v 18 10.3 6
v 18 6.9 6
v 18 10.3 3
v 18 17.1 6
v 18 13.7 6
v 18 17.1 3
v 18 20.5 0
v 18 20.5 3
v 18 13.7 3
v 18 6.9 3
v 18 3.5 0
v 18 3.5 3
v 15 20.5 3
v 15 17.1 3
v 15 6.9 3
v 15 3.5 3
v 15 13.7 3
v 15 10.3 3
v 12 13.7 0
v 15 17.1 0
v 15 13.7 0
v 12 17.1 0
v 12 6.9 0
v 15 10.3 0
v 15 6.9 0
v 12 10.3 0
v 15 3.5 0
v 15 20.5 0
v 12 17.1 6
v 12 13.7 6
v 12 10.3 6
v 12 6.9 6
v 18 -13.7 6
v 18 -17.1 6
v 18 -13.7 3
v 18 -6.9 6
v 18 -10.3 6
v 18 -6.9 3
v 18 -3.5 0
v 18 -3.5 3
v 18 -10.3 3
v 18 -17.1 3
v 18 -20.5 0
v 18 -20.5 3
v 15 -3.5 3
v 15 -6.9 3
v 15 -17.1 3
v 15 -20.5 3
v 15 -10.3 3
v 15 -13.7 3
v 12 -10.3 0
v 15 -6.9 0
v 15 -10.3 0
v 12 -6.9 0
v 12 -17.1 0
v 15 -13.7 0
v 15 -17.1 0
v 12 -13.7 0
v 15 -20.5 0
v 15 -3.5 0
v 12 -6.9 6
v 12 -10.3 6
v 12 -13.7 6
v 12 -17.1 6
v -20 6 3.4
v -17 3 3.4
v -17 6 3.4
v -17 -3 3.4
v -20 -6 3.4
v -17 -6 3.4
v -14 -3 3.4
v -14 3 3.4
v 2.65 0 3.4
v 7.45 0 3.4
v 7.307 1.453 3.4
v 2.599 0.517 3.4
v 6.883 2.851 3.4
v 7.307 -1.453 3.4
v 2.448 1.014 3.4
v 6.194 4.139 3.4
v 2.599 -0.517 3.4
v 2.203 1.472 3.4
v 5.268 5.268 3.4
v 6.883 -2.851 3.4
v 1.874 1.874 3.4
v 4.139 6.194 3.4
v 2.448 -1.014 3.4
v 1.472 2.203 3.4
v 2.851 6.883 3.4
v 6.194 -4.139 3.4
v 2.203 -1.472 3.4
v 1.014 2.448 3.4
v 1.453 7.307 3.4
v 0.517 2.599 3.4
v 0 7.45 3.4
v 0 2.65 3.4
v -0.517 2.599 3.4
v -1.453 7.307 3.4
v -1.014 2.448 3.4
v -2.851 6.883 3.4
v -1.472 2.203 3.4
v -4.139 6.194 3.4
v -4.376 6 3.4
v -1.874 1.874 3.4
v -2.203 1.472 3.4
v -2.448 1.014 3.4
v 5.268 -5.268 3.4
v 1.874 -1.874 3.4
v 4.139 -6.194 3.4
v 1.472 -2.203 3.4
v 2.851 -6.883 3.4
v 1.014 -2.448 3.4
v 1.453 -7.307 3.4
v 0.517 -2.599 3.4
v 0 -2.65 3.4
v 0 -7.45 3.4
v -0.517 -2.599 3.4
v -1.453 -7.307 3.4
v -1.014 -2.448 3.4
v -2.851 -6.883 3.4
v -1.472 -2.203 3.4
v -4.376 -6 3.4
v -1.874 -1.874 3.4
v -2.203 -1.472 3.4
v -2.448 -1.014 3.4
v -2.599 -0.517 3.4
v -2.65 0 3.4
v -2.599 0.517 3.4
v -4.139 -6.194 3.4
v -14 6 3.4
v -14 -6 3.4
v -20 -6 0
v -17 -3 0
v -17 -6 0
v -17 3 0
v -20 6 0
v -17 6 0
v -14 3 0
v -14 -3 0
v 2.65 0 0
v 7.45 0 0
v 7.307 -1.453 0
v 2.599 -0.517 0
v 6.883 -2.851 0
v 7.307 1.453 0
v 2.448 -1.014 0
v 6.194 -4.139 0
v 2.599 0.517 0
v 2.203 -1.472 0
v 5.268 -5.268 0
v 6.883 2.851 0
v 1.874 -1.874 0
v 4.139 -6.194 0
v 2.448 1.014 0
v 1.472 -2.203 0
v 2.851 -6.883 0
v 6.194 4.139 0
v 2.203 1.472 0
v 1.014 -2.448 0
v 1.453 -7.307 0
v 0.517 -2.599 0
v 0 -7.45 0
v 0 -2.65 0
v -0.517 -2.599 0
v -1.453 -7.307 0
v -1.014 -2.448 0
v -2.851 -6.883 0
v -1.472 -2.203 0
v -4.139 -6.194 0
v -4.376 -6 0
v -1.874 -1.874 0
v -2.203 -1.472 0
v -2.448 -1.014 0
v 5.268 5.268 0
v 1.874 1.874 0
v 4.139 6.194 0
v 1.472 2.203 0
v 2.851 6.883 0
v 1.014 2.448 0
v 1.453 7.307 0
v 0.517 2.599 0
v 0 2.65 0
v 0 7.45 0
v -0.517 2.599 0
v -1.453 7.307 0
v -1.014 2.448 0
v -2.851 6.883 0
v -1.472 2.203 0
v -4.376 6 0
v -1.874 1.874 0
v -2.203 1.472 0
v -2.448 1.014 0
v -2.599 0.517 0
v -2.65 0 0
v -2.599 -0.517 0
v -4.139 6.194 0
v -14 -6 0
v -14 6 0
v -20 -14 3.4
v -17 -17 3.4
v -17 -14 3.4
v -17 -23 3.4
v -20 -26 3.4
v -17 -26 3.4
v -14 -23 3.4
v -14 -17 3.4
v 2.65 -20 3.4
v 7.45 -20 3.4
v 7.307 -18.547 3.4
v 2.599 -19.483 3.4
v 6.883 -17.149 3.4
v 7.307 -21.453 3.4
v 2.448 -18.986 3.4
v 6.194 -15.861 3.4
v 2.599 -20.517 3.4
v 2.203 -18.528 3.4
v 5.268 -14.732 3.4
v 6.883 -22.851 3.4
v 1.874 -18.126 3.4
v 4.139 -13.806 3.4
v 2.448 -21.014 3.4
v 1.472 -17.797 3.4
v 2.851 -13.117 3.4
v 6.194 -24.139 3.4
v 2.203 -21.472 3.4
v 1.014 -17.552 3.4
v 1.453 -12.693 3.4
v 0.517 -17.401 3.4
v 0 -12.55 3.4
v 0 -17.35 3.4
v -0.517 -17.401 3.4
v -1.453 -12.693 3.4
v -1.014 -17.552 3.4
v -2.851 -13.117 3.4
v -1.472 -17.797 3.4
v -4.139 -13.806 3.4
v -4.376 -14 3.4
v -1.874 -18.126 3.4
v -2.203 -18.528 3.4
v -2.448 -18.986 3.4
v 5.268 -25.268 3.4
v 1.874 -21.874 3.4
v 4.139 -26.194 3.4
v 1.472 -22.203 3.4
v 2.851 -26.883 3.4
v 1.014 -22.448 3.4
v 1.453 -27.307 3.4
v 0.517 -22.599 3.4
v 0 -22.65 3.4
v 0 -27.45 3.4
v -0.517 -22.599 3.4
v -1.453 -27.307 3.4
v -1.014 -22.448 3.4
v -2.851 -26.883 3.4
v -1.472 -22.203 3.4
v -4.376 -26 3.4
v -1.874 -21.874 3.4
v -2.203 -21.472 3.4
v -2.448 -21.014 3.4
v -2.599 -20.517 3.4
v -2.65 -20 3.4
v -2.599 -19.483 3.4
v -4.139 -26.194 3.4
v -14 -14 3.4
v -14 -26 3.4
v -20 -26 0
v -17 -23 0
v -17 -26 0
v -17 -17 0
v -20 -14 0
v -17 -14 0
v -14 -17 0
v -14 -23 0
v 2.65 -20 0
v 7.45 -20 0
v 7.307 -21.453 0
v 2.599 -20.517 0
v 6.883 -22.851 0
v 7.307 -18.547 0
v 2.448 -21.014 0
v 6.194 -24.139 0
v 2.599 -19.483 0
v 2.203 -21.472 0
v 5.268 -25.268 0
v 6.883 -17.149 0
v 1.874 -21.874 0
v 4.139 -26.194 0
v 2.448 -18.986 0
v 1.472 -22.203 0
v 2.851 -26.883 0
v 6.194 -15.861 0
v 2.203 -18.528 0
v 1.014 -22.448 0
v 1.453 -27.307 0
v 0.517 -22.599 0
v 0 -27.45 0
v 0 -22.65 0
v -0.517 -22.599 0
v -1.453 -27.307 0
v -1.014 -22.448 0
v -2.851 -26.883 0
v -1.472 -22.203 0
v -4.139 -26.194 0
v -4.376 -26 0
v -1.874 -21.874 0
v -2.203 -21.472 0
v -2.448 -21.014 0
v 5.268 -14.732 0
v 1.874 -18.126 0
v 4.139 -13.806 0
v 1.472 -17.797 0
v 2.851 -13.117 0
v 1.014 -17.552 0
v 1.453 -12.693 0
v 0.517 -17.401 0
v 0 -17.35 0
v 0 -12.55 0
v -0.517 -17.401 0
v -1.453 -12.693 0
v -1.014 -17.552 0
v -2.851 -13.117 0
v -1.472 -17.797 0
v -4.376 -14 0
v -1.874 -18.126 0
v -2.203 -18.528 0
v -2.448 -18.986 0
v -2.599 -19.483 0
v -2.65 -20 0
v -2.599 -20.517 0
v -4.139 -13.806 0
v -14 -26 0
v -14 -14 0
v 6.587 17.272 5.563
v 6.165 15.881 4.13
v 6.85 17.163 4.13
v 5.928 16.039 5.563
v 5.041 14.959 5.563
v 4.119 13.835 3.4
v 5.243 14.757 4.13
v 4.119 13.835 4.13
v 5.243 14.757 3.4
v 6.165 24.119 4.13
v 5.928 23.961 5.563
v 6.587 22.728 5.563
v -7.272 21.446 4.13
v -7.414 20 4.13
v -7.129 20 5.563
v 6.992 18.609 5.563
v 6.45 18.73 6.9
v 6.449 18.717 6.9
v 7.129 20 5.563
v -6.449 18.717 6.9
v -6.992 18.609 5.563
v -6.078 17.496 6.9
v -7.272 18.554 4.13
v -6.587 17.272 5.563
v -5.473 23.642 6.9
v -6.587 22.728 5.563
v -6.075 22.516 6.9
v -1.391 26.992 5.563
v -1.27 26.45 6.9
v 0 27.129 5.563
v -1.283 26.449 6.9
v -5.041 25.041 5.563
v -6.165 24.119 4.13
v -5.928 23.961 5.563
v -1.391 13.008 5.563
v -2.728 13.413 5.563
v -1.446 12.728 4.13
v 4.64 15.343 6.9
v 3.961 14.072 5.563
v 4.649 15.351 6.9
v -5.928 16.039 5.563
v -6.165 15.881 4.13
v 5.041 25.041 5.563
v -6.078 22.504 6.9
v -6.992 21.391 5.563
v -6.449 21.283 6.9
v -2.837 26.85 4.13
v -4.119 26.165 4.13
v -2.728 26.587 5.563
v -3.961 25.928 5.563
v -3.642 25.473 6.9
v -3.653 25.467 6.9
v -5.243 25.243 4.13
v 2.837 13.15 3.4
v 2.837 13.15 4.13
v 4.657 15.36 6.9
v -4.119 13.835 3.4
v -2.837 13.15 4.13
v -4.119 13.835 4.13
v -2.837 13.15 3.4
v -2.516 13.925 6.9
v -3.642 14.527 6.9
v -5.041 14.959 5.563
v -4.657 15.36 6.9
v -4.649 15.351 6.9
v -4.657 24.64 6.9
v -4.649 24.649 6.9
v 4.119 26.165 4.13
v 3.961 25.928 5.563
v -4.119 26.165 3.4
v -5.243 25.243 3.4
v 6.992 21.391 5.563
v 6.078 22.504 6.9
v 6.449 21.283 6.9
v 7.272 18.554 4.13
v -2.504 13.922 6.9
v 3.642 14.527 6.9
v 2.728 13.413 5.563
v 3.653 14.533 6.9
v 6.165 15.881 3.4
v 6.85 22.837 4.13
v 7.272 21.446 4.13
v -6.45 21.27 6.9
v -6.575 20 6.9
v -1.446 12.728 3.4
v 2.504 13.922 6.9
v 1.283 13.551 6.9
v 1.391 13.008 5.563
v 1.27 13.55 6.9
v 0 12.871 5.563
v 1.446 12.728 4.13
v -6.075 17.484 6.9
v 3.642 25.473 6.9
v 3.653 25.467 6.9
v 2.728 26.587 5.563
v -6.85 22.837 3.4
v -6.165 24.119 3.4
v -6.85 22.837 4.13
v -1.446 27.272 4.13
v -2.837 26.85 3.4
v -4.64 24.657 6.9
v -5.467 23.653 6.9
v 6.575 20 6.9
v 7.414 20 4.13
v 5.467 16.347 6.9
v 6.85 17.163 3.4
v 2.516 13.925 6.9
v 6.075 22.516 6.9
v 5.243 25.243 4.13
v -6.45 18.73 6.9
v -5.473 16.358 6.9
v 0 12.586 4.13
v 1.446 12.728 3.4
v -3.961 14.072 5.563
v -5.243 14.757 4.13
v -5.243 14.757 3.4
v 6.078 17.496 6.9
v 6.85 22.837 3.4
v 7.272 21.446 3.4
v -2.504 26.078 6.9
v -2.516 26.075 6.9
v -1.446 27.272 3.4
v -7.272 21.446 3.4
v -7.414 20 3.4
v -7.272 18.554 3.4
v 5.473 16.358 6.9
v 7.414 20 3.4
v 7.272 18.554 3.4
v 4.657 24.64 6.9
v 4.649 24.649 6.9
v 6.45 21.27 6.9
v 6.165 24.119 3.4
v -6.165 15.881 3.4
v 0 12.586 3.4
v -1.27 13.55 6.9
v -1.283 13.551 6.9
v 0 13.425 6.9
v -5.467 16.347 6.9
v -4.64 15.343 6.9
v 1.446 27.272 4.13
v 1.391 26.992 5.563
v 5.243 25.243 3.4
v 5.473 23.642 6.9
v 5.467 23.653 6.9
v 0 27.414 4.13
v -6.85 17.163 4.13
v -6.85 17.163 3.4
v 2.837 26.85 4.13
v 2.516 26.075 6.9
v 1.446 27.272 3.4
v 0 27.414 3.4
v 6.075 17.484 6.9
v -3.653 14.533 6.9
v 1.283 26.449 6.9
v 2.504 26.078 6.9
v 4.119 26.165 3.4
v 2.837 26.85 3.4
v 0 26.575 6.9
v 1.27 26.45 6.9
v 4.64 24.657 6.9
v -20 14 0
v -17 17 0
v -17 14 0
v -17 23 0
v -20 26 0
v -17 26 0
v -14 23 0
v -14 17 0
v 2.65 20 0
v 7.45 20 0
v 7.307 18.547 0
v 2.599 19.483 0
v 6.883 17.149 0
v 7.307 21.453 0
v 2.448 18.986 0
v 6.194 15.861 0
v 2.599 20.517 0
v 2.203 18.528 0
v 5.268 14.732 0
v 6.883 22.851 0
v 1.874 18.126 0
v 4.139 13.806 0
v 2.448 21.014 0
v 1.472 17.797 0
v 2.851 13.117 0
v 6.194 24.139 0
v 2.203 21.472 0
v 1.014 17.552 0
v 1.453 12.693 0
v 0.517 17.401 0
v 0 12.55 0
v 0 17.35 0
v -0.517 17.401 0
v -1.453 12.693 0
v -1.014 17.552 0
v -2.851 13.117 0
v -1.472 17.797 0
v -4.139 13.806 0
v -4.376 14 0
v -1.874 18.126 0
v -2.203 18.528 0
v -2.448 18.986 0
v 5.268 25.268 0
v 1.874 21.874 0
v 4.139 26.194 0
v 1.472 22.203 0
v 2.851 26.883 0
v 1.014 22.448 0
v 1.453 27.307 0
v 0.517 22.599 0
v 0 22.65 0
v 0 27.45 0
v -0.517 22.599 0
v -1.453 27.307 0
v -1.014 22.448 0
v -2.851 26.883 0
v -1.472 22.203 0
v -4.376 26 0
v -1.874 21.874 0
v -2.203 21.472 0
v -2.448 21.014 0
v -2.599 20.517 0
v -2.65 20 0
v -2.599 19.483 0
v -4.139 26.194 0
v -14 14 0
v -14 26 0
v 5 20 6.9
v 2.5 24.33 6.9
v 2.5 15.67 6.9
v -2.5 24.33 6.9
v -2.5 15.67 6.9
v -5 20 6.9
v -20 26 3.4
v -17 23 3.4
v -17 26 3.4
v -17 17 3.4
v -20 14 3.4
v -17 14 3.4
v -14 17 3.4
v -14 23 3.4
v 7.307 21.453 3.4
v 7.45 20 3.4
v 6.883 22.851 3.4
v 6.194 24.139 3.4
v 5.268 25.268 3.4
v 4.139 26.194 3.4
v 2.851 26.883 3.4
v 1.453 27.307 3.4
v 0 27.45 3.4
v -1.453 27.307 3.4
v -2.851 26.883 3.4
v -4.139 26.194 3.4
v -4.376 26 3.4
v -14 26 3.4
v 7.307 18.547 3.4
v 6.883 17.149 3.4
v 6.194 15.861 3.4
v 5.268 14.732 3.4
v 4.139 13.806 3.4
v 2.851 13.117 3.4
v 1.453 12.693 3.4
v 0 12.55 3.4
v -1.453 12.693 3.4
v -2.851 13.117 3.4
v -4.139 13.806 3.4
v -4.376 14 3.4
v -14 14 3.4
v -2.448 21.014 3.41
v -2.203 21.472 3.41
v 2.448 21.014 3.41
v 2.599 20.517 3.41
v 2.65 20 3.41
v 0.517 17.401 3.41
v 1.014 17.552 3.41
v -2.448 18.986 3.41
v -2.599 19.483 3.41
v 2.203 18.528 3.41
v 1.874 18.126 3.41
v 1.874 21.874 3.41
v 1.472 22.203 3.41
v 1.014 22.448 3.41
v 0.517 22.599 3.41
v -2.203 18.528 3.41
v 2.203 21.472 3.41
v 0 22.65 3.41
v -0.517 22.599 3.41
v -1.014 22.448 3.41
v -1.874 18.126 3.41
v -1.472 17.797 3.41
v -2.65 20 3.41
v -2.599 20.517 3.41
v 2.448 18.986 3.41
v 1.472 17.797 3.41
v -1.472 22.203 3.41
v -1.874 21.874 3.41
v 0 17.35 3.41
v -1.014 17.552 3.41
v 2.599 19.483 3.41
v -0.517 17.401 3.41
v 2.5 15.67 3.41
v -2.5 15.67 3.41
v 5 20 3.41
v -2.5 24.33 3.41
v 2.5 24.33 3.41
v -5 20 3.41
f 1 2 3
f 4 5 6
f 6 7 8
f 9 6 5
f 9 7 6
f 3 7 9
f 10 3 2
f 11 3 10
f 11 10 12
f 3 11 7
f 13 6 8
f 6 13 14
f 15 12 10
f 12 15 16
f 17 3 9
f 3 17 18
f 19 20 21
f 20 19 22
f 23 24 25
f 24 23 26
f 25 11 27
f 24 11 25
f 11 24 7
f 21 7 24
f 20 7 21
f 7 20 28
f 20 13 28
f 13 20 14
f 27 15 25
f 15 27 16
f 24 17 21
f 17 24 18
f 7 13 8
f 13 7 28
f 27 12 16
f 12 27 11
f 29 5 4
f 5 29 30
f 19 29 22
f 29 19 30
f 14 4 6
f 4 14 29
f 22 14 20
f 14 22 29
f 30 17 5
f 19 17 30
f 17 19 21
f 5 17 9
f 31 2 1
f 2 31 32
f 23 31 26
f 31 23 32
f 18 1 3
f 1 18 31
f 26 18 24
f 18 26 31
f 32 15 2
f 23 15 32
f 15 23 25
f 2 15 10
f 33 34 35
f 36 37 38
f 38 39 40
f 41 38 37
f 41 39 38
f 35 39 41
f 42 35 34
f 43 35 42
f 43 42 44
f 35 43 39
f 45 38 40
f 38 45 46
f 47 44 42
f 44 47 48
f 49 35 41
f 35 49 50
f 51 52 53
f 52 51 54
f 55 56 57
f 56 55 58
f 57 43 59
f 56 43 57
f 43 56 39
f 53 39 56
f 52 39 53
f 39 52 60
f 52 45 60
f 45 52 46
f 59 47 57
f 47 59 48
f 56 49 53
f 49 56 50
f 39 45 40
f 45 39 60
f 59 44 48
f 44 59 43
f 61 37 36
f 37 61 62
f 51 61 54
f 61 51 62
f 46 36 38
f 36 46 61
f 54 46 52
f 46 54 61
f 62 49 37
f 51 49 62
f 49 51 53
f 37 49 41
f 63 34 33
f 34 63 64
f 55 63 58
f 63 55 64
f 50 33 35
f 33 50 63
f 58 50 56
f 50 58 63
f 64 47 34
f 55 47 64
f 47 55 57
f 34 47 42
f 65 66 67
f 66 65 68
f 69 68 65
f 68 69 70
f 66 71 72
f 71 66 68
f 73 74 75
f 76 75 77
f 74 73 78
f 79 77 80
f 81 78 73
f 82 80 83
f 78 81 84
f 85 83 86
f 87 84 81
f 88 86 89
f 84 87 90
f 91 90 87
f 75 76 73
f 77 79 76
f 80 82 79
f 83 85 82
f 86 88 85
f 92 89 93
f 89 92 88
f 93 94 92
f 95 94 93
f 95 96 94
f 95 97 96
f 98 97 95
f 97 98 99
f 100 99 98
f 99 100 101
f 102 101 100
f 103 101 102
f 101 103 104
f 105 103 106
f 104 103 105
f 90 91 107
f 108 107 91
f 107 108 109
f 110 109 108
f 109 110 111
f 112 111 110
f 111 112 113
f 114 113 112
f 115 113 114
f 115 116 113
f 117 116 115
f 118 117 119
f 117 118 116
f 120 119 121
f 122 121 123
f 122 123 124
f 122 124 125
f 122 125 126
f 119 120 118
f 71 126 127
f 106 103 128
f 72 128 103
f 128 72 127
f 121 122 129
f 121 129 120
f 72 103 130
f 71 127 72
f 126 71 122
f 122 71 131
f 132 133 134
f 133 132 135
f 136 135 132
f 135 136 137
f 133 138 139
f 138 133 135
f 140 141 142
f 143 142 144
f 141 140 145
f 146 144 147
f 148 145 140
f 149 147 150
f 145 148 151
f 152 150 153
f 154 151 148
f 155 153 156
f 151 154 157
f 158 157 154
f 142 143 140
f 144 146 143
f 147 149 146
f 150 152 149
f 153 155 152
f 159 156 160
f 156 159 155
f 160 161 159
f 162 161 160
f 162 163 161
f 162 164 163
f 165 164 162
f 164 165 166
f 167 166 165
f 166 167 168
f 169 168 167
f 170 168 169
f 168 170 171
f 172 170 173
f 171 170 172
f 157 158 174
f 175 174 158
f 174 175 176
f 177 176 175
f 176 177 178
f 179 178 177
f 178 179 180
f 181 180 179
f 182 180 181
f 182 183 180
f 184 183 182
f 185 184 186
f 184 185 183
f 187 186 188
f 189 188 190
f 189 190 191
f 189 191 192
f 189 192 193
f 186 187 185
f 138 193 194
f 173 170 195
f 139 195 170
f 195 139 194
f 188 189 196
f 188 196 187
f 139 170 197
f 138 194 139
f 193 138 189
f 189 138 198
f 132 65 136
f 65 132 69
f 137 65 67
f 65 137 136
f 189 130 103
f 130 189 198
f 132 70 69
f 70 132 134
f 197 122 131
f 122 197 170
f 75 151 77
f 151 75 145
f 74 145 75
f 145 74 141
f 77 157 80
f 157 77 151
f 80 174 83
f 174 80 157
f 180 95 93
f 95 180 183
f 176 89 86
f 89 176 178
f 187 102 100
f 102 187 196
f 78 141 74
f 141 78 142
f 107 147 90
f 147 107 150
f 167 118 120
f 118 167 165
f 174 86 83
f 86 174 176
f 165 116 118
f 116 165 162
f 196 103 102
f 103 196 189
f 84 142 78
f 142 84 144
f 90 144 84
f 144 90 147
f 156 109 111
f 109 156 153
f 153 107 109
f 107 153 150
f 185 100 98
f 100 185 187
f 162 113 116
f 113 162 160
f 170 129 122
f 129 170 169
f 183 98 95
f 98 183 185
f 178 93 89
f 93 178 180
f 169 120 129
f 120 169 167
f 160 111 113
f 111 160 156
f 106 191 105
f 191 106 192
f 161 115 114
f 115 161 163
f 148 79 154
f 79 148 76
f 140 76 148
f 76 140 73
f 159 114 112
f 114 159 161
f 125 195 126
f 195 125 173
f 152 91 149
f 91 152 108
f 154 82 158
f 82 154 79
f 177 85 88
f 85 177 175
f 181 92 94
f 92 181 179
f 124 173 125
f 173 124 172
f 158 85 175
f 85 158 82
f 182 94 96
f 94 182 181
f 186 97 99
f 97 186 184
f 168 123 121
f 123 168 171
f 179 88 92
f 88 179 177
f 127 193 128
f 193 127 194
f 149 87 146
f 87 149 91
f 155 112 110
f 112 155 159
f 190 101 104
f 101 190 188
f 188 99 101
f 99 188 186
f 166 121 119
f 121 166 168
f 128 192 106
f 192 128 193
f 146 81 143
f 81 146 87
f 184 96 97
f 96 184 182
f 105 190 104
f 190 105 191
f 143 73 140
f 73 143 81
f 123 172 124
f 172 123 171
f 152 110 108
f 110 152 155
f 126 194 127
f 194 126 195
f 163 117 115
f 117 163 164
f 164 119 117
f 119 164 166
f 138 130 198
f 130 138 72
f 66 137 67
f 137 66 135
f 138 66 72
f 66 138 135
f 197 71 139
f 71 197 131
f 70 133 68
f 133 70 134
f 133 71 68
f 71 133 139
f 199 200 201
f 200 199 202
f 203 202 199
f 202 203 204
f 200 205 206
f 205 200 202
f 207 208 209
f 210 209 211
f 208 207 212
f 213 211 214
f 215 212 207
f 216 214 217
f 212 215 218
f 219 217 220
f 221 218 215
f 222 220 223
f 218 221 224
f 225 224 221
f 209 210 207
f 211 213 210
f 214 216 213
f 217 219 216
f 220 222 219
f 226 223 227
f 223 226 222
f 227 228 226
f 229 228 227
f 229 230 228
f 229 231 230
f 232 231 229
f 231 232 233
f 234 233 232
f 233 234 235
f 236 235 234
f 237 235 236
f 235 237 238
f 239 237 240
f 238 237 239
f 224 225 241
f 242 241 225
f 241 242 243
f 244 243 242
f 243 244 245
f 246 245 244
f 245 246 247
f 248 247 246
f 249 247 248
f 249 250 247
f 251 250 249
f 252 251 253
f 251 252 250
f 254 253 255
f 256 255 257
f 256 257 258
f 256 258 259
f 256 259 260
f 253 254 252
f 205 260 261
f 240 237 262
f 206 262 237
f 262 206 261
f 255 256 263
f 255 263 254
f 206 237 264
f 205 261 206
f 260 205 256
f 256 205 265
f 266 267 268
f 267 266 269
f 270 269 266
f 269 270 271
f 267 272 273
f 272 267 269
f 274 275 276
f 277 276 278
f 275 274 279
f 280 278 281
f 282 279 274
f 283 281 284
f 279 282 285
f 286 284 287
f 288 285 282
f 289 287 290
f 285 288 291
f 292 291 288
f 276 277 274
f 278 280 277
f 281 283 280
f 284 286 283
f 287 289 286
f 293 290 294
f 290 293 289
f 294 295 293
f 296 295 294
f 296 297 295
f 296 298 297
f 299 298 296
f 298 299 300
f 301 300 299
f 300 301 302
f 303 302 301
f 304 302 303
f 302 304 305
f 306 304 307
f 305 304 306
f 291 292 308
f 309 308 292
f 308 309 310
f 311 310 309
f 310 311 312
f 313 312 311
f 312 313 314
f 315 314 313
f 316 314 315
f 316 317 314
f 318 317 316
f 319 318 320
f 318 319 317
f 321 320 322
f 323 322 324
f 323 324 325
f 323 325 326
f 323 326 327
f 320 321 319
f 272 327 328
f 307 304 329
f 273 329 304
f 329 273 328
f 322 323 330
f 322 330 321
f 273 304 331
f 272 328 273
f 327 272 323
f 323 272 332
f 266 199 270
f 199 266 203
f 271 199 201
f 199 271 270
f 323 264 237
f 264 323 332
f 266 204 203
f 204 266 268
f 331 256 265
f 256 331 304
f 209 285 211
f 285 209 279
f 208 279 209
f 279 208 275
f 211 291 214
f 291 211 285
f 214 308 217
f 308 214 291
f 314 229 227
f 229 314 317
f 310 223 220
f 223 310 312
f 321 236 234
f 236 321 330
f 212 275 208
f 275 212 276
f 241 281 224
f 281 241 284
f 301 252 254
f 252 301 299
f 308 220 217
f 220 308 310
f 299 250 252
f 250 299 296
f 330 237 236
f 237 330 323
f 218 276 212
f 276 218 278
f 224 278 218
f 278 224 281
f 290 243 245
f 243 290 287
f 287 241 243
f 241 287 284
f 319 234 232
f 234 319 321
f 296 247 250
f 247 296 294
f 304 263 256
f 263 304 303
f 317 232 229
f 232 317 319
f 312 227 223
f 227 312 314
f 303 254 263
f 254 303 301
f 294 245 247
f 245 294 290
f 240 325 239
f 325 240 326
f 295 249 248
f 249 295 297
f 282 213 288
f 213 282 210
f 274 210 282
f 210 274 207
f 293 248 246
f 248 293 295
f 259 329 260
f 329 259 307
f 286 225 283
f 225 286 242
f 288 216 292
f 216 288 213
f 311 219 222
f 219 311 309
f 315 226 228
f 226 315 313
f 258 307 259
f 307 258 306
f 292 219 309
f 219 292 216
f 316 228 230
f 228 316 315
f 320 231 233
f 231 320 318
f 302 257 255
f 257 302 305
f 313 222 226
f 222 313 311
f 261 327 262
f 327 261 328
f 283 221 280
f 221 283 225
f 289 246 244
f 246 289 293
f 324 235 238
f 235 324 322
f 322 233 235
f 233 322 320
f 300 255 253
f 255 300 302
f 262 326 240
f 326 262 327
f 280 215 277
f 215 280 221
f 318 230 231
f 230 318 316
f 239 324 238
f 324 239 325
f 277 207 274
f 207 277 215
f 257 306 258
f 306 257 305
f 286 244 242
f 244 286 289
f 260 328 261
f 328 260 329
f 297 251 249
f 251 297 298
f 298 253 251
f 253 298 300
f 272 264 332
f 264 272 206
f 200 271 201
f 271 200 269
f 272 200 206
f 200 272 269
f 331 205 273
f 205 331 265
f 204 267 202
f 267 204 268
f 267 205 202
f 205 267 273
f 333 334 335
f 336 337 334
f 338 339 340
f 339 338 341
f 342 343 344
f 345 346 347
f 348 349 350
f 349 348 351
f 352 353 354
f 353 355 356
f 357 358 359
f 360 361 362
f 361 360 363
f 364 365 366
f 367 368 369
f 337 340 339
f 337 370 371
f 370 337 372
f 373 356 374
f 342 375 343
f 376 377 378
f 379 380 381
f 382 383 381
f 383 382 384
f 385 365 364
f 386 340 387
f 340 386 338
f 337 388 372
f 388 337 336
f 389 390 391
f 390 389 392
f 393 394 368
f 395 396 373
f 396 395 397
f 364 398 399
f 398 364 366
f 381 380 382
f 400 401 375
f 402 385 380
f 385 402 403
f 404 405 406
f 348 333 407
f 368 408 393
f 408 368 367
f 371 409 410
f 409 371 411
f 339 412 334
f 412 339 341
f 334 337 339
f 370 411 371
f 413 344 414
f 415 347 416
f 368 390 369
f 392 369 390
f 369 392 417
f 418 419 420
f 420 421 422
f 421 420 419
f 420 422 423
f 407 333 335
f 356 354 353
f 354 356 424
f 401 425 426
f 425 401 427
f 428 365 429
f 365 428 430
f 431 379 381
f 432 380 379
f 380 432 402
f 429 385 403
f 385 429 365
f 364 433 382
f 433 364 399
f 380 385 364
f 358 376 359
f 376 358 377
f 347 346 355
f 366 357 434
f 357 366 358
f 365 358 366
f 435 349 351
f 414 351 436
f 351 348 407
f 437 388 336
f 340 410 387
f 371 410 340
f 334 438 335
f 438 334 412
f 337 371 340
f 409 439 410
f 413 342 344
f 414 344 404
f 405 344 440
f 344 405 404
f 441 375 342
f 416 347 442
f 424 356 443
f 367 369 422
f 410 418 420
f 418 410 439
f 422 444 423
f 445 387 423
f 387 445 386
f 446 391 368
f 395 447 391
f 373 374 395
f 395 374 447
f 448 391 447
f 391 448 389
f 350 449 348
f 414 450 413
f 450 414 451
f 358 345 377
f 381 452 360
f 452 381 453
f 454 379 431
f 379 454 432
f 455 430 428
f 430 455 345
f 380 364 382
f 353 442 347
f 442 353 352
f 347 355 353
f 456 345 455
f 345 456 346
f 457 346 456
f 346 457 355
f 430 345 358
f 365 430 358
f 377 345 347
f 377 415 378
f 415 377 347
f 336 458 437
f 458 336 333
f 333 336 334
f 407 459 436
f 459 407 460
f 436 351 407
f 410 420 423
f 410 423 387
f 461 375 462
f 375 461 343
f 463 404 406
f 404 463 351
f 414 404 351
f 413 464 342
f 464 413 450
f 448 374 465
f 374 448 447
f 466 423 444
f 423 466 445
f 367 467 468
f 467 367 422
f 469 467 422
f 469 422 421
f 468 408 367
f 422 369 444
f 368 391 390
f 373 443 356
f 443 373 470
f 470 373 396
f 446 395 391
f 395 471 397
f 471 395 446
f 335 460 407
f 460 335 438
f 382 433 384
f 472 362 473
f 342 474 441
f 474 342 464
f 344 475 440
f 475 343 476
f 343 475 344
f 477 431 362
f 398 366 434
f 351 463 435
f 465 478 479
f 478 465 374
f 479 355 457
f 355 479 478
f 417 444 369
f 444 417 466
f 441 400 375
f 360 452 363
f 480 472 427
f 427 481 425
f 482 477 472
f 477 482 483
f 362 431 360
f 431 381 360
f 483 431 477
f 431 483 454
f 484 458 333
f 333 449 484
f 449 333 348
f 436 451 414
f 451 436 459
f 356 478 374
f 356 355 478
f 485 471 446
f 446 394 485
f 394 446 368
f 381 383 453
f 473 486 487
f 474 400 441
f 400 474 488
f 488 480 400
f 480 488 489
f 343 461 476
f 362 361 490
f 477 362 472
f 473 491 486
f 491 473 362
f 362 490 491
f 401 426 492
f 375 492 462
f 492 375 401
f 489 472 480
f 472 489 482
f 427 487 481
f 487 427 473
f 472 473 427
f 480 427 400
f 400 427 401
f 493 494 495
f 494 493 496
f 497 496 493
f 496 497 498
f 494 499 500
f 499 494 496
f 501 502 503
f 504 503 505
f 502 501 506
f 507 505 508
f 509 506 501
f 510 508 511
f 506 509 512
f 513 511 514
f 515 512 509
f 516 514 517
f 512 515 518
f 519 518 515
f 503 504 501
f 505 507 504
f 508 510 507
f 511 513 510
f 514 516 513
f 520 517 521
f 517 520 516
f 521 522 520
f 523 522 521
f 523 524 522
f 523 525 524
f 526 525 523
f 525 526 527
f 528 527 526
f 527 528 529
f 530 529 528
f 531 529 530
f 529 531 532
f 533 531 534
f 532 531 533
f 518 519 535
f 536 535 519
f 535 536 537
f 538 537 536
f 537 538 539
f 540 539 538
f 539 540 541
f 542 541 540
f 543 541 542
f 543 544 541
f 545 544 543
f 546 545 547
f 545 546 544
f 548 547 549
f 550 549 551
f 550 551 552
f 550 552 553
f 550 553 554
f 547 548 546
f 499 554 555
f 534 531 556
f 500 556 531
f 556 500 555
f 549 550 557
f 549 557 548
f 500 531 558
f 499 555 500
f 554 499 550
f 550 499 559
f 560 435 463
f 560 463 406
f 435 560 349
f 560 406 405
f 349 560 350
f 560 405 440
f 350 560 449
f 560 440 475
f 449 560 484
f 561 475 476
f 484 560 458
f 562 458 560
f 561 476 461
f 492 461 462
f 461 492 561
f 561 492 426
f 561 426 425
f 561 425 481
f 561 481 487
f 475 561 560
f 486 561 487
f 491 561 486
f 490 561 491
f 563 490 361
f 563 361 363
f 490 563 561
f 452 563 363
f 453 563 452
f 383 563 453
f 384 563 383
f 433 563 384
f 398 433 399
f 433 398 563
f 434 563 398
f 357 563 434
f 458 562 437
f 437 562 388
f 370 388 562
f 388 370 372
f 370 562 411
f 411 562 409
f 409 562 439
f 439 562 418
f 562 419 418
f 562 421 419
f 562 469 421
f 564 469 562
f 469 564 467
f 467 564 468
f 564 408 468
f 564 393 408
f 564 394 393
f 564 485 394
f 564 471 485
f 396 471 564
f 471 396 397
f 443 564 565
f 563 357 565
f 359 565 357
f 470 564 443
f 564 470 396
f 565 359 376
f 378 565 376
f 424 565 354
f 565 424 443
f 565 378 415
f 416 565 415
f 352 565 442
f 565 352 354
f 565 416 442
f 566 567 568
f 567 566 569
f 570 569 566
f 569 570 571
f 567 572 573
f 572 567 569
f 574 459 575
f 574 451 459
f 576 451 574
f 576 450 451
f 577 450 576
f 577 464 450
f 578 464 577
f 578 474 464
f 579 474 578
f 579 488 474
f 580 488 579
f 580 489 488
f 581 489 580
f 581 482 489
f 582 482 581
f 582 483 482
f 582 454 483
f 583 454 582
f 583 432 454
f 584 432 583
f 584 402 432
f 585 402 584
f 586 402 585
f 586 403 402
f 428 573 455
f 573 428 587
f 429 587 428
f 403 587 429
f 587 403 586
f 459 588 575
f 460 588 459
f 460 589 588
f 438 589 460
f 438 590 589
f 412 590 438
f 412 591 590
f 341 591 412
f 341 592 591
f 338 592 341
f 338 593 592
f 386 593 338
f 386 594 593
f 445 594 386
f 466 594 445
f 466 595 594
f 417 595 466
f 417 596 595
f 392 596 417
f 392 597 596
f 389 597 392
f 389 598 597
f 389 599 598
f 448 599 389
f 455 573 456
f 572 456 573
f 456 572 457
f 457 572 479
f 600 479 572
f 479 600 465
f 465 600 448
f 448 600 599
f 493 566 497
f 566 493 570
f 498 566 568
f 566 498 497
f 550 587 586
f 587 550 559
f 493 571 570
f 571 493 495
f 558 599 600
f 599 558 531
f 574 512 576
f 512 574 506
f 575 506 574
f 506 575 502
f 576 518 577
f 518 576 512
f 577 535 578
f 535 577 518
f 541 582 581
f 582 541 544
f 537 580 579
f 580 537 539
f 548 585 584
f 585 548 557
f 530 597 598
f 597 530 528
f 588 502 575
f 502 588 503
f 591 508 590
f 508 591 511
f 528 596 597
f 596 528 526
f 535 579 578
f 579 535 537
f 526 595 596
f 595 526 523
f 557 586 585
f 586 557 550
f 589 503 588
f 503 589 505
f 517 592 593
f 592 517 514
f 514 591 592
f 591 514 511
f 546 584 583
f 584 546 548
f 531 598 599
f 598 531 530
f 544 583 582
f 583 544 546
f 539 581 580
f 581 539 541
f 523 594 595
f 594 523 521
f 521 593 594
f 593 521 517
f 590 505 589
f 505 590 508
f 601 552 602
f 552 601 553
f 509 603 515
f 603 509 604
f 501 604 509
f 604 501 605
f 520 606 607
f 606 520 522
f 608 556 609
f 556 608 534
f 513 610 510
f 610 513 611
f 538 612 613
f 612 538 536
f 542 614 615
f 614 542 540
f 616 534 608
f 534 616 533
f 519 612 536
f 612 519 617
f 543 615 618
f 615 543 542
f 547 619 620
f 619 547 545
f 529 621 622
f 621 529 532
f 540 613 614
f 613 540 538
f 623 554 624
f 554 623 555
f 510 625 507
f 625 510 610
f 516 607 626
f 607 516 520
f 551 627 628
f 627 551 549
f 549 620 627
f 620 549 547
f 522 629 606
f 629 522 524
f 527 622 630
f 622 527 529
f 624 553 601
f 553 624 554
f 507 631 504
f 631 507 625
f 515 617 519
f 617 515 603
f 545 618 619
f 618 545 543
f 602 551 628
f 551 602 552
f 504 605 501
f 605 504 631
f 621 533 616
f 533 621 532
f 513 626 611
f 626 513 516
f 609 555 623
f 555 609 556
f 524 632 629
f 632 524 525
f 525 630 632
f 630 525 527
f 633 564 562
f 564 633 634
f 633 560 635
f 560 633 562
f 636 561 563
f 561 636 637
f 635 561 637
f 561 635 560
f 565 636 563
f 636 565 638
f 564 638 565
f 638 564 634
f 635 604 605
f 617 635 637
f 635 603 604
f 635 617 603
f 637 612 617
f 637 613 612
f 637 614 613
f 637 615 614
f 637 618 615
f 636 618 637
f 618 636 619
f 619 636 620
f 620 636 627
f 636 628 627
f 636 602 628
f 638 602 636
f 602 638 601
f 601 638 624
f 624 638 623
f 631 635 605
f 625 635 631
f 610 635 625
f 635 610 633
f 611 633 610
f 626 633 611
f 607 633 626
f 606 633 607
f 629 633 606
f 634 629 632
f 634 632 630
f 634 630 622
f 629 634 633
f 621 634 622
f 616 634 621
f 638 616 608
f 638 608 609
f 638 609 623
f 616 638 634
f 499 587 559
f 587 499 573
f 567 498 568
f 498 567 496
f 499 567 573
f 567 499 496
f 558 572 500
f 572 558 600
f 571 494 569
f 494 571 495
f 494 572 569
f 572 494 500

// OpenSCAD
// file: simple_objects.scad
//
// Simple objects
//
// By Jay Abbott 2013
//



/**
 * Box
 *
 * Draws a simple box with dimensions provided in the sz vector.
 *
 * The origin (transformation centre) of the box is controlled by the
 * cx, cy, and cz parameters. 0 for any axis means that the lower-extent
 * of the box is at the origin, and the box extends entirely in the
 * positive direction along that axis. 1 means the upper-edge of the
 * box is at the origin, and the box extends entirely in the negative
 * direction along that axis.
 *
 * The default centre-value is 0.5 for all axes so that the
 * origin of the box is in the centre of the box shape.
 *
 * @param sz	A vector with the [x, y, z] dimensions.
 * @param cx	The x-center
 * @param cy	The y-center
 * @param cz	The z-center
 */

module box(
	sz	= [1, 1, 1],
	cx	= 0.5,
	cy	= 0.5,
	cz	= 0.5)
{
	translate([-sz[0] * cx, -sz[1] * cy, -sz[2] * cz])
		cube(sz);
}
// main file
use <simple_objects.scad>;



// Constants
// --------------------------------

detail = 32;

clipDiameter = 14.9;
plateWidth = 12;
plateLength = 20;
plateDepth = 3.4;

nutHeight = 3.5;
nutDiameter = 10;

holeDiameter = 5.3;
notchSize = 3;



// Modules
// --------------------------------

module clipPlate(withNut = false)
{
	offset = -(plateLength - (2 * notchSize));

	difference()
	{
		union()
		{
			// Clip plate (box and cylinder)
			box([plateLength, plateWidth, plateDepth], cx = 1, cz = 0);
			cylinder(r = clipDiameter / 2, h = plateDepth, $fn = detail);

			// Nut housing
			if(withNut)
			{
				intersection()
				{
					translate([0, 0, plateDepth])
						sphere(r = clipDiameter / 2, $fn = detail);
					cylinder(r = clipDiameter / 2, h = plateDepth + nutHeight, $fn = detail);
				}
			}
		}

		// Central hole
		translate([0, 0, -plateDepth * 0.05 / 2])
			cylinder(r = holeDiameter/2, h = plateDepth * 1.1, $fn = detail);

		// Nut hole
		if(withNut)
		{
			translate([0, 0, plateDepth + 0.01])
				cylinder(r = nutDiameter/2, h = nutHeight, $fn = 6);
		}

		// Notches
		translate([offset,  plateWidth / 2, -plateDepth * 0.1])
			box([notchSize, notchSize * 2, (plateDepth * 1.2)], cz = 0, cx = 1);
		translate([offset, -plateWidth / 2, -plateDepth * 0.1])
			box([notchSize, notchSize * 2, (plateDepth * 1.2)], cz = 0, cx = 1);
	}
}

module connector()
{
	union()
	{
		// Stem
		box([notchSize, plateDepth * 5, notchSize], cz = 0, cx = 1);

		// Separator 1
		translate([0, plateDepth, 0])
			box([plateWidth / 2, plateDepth, notchSize * 2], cz = 0, cx = 1);

		// Separator 2
		translate([0, -plateDepth, 0])
			box([plateWidth / 2, plateDepth, notchSize * 2], cz = 0, cx = 1);
	}
}



// The model
// --------------------------------

// Two connectors
translate([18,12,0])
	connector();

translate([18,-12,0])
	connector();

// Bottom/middle plate
translate([0,0,0])
	clipPlate(false);

// Bottom/middle plate
translate([0,-20,0])
	clipPlate(false);

// Top plate
translate([0,20,0])
	clipPlate(true);
